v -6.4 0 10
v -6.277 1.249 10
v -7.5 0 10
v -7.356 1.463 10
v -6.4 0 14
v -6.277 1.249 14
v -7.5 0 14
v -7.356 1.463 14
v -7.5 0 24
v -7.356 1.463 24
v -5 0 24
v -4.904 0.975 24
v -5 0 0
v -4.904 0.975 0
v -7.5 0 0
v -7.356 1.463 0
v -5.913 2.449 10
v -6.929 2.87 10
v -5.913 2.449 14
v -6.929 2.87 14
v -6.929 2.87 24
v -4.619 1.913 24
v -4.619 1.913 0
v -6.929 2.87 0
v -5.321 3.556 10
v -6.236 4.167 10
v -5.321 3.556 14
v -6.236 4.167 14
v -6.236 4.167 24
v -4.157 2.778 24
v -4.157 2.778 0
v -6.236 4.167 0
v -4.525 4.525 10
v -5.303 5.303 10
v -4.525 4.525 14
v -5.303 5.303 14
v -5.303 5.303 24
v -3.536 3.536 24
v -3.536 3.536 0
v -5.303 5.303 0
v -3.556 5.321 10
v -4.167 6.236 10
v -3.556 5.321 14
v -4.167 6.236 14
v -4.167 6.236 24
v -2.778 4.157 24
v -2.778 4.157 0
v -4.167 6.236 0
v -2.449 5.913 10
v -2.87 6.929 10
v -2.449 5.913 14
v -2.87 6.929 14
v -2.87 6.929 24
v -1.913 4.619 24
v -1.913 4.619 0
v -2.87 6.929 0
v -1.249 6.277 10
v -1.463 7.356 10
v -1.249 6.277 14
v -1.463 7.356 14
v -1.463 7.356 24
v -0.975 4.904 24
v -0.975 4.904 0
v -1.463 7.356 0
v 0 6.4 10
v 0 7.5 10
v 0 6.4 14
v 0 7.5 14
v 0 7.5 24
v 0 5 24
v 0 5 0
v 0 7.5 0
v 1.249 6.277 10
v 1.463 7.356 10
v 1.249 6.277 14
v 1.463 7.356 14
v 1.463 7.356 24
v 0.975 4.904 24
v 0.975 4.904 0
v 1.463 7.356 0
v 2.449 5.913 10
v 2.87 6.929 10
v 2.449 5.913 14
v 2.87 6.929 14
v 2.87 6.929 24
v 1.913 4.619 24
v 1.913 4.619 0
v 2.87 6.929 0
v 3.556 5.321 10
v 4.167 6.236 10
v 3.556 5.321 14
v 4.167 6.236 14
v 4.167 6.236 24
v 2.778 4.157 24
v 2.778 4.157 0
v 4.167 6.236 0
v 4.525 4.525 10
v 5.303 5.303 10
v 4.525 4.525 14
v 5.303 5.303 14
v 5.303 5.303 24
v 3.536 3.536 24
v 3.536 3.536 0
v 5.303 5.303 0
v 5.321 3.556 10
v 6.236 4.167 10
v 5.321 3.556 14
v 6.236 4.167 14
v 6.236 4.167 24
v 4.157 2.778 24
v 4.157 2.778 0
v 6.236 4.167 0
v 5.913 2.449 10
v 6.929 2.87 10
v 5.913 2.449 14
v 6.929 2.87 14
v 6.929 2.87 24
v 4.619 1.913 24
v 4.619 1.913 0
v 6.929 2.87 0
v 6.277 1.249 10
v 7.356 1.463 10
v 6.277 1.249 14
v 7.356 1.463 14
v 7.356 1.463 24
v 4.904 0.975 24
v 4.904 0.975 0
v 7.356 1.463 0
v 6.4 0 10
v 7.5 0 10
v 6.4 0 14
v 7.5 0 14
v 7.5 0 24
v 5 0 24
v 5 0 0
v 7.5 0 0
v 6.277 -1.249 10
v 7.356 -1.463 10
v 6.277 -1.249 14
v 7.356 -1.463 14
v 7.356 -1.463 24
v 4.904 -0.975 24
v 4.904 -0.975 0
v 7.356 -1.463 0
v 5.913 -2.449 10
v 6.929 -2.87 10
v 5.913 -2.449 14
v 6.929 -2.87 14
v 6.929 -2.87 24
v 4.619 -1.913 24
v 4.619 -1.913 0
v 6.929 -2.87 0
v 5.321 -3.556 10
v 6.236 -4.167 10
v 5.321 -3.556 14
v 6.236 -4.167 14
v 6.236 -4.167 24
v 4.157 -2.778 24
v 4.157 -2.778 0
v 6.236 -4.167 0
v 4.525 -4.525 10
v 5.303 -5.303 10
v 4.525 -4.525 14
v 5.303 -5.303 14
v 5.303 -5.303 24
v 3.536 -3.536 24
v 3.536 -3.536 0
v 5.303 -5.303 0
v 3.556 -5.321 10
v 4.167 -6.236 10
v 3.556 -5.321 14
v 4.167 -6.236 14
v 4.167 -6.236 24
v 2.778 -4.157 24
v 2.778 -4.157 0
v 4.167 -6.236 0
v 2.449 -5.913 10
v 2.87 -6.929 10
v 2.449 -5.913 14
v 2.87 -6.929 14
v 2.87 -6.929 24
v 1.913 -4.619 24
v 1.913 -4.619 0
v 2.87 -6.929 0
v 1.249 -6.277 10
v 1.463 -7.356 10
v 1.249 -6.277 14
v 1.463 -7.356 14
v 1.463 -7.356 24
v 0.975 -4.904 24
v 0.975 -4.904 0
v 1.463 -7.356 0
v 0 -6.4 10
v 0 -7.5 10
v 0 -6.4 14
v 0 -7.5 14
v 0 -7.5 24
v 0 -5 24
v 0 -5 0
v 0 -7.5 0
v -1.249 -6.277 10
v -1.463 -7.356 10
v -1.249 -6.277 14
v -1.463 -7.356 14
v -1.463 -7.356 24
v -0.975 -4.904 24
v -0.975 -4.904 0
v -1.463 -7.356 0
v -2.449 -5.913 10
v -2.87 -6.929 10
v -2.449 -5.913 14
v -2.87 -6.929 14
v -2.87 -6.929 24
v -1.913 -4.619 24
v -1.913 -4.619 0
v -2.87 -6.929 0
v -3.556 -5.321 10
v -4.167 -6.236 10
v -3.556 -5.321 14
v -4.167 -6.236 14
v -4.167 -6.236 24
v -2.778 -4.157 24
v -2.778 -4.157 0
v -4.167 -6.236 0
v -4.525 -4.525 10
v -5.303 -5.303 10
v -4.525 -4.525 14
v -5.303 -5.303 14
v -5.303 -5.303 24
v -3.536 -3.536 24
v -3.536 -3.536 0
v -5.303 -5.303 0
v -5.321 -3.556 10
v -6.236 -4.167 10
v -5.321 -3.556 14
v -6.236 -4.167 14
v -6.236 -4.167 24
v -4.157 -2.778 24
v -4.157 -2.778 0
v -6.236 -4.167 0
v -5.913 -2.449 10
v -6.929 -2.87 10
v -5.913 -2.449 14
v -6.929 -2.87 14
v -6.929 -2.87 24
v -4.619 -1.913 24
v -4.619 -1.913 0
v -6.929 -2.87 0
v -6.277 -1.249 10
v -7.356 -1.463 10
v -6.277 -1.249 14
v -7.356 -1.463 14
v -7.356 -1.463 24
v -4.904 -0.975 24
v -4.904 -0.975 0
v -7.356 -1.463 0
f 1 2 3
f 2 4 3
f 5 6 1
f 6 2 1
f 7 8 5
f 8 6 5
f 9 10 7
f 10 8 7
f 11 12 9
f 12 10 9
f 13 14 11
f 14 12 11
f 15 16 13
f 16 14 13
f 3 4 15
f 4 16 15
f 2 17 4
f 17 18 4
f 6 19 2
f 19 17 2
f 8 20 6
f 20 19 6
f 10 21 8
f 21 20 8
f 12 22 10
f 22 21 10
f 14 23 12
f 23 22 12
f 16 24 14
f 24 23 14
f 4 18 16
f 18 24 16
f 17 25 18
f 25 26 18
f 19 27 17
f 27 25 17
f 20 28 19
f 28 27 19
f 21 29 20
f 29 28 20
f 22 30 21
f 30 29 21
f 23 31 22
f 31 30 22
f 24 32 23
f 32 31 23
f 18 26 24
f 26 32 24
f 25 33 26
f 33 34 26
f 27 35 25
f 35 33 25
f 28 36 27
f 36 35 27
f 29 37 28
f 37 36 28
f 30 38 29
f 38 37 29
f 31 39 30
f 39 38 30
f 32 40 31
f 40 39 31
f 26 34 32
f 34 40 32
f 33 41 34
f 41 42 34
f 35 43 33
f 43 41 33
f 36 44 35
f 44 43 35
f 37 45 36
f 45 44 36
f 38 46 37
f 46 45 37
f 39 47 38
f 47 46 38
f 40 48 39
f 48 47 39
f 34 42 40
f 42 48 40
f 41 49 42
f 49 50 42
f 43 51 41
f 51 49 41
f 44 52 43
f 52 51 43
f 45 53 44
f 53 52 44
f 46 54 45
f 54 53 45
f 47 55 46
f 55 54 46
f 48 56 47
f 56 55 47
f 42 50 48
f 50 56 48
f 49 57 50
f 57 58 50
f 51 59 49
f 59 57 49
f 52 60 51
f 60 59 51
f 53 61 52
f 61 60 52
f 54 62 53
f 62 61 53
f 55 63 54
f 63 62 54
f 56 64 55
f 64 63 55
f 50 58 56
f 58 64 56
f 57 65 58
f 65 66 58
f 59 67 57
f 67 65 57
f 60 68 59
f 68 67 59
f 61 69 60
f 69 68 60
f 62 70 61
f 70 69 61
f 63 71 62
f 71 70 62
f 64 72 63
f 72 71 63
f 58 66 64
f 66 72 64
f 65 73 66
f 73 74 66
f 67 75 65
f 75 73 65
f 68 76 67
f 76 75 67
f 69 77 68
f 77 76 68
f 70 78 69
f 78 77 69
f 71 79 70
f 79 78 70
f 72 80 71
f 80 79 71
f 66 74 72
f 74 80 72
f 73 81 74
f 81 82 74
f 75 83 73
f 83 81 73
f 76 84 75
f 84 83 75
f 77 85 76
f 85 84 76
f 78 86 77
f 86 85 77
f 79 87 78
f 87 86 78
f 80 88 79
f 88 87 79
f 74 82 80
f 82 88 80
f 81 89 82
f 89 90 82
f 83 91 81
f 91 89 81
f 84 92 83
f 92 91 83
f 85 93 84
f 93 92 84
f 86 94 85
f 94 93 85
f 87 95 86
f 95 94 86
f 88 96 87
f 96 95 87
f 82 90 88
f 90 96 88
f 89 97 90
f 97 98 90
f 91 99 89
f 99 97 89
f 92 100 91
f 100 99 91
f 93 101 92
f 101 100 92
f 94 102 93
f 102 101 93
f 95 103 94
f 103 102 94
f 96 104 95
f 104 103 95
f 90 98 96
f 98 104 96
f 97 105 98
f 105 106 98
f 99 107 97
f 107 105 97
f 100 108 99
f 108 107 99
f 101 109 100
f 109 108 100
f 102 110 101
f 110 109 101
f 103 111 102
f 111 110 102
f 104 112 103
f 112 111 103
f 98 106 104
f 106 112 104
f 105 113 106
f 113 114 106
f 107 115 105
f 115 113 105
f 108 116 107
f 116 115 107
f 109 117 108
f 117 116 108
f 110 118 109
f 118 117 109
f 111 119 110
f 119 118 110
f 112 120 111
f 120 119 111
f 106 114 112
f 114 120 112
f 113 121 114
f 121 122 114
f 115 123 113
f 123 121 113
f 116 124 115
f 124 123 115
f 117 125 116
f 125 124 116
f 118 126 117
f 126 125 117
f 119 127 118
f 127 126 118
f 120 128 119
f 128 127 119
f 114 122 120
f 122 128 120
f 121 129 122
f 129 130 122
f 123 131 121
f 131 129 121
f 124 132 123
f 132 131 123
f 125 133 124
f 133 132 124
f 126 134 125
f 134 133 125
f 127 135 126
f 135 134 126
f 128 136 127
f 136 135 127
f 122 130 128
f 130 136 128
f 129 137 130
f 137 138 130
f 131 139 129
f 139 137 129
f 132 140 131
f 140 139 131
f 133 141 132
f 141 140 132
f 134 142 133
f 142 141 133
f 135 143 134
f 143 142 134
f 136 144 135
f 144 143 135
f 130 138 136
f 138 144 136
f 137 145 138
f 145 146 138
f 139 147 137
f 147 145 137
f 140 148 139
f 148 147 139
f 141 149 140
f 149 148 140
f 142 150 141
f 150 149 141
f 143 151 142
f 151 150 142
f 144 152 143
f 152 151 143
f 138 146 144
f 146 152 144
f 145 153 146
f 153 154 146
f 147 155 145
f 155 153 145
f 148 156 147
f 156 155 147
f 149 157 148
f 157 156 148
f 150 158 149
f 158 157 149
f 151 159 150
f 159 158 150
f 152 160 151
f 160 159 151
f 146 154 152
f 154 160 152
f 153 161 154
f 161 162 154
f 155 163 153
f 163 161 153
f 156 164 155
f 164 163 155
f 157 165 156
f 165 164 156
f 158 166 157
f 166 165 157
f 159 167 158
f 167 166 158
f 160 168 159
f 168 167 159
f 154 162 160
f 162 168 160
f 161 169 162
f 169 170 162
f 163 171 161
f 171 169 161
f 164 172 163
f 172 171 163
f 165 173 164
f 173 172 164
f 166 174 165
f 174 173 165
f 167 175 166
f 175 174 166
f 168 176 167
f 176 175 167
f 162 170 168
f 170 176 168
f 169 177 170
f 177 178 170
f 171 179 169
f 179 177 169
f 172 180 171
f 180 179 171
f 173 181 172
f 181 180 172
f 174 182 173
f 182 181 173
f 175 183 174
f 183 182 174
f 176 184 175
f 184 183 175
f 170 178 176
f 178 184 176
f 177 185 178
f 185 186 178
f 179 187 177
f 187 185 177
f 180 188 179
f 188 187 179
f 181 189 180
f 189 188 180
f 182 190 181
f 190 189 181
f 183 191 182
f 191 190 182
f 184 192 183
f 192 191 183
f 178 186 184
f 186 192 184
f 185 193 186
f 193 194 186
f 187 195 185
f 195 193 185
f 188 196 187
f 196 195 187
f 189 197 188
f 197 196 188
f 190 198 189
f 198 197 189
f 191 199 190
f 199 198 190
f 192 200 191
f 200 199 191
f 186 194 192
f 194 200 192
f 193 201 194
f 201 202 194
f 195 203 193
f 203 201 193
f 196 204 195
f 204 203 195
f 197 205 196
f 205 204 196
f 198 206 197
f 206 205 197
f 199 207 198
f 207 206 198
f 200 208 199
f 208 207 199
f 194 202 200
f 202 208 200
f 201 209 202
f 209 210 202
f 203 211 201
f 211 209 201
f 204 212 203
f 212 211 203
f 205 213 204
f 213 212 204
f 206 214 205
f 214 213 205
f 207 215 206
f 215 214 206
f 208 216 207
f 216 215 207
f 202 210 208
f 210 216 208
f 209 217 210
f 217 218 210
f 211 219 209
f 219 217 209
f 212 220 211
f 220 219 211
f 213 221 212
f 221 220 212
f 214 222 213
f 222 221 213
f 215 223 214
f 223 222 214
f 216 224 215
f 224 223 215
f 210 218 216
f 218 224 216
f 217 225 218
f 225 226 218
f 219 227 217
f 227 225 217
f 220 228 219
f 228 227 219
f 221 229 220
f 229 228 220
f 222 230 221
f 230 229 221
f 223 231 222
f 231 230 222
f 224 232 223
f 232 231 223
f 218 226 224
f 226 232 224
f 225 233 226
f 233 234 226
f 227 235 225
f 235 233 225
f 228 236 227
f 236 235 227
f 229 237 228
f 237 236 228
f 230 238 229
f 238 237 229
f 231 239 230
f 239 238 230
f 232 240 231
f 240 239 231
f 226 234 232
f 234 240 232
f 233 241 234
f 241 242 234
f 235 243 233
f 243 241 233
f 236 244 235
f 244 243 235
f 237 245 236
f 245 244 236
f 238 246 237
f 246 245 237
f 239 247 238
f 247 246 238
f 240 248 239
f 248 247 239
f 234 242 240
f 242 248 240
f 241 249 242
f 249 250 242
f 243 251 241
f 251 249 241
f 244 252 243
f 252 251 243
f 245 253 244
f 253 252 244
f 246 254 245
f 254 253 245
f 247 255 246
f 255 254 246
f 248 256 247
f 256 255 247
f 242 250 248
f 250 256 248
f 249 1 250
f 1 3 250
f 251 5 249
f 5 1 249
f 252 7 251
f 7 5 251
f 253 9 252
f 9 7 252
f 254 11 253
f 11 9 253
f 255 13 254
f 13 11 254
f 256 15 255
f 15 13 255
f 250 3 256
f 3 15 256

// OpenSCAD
$fn = 32;

// ----------------------------------------------------------------------
// Grooved revolve: plain_grooves, bore R5
// ----------------------------------------------------------------------

// --- parameters (mm) ---
bore_r = 5;               // bore radius
outer_r = 7.5;            // outer radius of the body
total_h = 24;             // overall height, Z
wall = 2.5;               // radial wall thickness
groove_w = 4;             // groove width
groove_d = 1.1;           // groove depth
grooves = 1;              // number of outer grooves
fit_tol = 0.02;           // declared fit tolerance (prompt contract)
free_tol = 0.2;           // declared free tolerance (prompt contract)

bbox_x = 2 * outer_r;  // full diameter
bore_d = 2 * bore_r;  // bore diameter
body_d = 2 * outer_r;  // body diameter
revolve_angle = 360;  // full turn around the Z axis

profile = [[5, 0], [7.5, 0], [7.5, 10], [6.4, 10], [6.4, 14], [7.5, 14], [7.5, 24], [5, 24]];  // primary outline, 8 points, counter clockwise

// --- the one profile operation ---
rotate_extrude(angle = revolve_angle) polygon(points = profile);
